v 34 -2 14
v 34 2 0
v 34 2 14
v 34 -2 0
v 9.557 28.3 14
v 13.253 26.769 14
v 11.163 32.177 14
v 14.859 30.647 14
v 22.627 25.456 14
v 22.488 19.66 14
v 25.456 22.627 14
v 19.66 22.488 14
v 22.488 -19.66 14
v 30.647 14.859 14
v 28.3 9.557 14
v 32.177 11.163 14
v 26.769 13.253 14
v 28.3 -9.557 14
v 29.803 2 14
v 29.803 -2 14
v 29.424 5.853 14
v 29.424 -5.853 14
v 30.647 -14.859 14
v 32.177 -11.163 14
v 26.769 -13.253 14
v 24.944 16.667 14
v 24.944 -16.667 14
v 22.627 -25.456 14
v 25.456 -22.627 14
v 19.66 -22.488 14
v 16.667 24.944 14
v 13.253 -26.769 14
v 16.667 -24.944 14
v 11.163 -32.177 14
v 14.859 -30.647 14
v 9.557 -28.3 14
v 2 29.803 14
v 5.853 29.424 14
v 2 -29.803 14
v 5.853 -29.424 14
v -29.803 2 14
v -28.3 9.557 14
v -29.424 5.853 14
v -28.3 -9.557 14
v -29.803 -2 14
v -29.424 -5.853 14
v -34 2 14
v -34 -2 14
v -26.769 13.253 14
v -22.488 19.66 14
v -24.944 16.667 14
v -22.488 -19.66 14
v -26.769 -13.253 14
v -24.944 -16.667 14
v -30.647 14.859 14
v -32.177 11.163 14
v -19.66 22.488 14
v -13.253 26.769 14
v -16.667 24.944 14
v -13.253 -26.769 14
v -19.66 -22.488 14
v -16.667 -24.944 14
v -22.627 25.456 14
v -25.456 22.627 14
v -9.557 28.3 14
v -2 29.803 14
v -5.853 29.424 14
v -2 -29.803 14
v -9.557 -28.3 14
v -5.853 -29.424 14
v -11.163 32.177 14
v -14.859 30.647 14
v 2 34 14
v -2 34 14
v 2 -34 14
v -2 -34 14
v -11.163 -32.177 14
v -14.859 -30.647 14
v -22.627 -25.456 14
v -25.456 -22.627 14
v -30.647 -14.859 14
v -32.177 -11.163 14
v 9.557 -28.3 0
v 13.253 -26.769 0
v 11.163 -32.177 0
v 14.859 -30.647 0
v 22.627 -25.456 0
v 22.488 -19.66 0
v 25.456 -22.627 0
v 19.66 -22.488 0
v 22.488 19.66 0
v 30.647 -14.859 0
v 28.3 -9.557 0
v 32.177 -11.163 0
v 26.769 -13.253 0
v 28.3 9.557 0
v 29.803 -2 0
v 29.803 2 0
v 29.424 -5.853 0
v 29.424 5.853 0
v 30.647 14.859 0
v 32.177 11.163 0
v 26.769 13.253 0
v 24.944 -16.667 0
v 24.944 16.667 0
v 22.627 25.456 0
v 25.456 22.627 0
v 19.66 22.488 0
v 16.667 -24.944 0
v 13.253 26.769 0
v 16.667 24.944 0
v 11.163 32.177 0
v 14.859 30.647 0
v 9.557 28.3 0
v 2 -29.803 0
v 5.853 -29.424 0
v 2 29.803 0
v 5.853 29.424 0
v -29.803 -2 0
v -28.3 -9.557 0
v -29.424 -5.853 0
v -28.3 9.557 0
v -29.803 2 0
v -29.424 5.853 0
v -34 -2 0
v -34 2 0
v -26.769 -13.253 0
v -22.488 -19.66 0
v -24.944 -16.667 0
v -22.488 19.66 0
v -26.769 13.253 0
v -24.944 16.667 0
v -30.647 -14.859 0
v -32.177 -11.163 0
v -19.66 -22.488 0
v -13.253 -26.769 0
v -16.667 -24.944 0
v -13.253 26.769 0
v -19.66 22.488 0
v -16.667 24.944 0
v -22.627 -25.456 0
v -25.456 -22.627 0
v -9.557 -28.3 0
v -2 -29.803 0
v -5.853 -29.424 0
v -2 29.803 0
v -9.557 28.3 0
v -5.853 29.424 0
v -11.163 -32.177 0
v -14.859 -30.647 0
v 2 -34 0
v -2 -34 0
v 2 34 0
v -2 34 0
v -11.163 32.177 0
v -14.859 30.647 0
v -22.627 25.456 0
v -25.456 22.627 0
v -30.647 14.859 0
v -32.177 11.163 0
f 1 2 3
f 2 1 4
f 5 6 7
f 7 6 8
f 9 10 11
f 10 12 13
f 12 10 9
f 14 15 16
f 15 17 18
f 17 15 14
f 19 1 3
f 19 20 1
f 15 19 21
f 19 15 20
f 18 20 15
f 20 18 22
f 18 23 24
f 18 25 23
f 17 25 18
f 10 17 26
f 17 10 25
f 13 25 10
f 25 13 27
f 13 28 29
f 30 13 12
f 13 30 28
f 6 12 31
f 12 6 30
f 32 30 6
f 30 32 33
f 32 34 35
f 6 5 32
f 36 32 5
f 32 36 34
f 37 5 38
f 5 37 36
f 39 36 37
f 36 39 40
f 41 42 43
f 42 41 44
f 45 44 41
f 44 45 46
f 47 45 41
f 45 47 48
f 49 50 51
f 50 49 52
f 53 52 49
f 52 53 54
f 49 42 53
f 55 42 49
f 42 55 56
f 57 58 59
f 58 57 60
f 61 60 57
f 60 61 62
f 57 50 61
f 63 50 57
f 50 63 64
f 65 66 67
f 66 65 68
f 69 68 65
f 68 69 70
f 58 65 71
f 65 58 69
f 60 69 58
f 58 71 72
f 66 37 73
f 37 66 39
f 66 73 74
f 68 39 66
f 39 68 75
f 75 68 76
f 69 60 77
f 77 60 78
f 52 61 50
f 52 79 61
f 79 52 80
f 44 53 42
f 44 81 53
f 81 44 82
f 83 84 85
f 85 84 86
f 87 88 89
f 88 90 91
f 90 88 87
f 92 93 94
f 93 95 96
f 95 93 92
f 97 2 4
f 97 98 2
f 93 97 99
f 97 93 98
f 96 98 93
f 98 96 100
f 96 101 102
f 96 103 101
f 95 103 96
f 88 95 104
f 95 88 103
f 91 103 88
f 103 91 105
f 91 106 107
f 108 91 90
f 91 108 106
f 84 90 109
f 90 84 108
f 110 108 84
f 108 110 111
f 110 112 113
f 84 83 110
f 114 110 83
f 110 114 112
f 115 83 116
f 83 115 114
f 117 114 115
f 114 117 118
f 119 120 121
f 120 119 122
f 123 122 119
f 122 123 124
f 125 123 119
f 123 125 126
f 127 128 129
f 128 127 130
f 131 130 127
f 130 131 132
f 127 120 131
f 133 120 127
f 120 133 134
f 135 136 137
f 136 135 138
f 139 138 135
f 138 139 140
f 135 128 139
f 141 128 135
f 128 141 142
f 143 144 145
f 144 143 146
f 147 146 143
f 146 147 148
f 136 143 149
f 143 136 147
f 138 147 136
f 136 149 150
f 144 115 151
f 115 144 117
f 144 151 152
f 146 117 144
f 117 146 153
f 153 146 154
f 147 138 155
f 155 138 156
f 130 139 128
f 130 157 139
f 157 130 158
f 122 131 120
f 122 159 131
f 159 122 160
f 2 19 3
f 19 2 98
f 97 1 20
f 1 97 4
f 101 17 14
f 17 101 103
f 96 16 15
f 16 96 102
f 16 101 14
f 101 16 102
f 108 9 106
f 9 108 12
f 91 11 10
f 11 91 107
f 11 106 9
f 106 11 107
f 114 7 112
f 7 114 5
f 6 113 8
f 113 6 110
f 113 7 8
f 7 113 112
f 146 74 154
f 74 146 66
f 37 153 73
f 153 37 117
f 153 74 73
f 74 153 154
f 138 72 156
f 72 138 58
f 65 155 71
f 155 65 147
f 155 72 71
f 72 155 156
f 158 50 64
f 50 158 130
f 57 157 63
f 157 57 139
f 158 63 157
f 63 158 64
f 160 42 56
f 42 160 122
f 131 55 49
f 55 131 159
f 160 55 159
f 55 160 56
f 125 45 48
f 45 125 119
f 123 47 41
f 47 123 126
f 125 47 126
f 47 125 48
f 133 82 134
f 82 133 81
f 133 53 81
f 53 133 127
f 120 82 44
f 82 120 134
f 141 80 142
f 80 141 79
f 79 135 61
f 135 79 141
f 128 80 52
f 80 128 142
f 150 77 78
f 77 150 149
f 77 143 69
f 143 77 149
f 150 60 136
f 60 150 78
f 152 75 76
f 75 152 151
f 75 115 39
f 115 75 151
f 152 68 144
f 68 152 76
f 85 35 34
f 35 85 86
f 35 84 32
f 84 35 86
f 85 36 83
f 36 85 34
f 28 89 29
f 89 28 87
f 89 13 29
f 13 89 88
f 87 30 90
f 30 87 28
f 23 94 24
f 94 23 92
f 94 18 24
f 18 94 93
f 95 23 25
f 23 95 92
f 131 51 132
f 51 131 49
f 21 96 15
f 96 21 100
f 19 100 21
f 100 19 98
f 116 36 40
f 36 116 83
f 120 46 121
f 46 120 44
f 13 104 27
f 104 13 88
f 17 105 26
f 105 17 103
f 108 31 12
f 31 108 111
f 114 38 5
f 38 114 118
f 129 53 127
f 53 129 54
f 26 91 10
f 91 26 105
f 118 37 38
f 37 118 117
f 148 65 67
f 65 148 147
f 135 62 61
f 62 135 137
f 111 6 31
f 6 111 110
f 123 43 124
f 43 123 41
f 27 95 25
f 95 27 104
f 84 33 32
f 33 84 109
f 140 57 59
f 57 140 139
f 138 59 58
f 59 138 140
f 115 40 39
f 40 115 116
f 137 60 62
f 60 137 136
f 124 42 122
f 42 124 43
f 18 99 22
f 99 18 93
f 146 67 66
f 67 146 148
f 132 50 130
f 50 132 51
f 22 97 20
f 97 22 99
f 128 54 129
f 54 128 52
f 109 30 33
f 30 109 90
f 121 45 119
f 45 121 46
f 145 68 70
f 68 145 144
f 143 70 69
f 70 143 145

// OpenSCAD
$fn = 32;

// ----------------------------------------------------------------------
// Spur blank: plain gear blank
// ----------------------------------------------------------------------

// --- parameters (mm) ---
disc_r = 30;              // blank root radius
disc_t = 14;              // blank thickness
n_teeth = 16;             // stub tooth count
tooth_w = 4;              // tooth width at the root
tooth_h = 4;              // tooth height above the root

out_r = disc_r + tooth_h;  // tip radius
bbox_x = 68.0;  // measured width over the teeth
bbox_y = 68.0;  // measured depth over the teeth

union() {
  cylinder(r = disc_r, h = disc_t);
  for (i = [0 : n_teeth - 1])
    rotate([0, 0, i * 360 / n_teeth])
      translate([disc_r - 1, -tooth_w / 2, 0])
        cube([tooth_h + 1, tooth_w, disc_t]);
}
